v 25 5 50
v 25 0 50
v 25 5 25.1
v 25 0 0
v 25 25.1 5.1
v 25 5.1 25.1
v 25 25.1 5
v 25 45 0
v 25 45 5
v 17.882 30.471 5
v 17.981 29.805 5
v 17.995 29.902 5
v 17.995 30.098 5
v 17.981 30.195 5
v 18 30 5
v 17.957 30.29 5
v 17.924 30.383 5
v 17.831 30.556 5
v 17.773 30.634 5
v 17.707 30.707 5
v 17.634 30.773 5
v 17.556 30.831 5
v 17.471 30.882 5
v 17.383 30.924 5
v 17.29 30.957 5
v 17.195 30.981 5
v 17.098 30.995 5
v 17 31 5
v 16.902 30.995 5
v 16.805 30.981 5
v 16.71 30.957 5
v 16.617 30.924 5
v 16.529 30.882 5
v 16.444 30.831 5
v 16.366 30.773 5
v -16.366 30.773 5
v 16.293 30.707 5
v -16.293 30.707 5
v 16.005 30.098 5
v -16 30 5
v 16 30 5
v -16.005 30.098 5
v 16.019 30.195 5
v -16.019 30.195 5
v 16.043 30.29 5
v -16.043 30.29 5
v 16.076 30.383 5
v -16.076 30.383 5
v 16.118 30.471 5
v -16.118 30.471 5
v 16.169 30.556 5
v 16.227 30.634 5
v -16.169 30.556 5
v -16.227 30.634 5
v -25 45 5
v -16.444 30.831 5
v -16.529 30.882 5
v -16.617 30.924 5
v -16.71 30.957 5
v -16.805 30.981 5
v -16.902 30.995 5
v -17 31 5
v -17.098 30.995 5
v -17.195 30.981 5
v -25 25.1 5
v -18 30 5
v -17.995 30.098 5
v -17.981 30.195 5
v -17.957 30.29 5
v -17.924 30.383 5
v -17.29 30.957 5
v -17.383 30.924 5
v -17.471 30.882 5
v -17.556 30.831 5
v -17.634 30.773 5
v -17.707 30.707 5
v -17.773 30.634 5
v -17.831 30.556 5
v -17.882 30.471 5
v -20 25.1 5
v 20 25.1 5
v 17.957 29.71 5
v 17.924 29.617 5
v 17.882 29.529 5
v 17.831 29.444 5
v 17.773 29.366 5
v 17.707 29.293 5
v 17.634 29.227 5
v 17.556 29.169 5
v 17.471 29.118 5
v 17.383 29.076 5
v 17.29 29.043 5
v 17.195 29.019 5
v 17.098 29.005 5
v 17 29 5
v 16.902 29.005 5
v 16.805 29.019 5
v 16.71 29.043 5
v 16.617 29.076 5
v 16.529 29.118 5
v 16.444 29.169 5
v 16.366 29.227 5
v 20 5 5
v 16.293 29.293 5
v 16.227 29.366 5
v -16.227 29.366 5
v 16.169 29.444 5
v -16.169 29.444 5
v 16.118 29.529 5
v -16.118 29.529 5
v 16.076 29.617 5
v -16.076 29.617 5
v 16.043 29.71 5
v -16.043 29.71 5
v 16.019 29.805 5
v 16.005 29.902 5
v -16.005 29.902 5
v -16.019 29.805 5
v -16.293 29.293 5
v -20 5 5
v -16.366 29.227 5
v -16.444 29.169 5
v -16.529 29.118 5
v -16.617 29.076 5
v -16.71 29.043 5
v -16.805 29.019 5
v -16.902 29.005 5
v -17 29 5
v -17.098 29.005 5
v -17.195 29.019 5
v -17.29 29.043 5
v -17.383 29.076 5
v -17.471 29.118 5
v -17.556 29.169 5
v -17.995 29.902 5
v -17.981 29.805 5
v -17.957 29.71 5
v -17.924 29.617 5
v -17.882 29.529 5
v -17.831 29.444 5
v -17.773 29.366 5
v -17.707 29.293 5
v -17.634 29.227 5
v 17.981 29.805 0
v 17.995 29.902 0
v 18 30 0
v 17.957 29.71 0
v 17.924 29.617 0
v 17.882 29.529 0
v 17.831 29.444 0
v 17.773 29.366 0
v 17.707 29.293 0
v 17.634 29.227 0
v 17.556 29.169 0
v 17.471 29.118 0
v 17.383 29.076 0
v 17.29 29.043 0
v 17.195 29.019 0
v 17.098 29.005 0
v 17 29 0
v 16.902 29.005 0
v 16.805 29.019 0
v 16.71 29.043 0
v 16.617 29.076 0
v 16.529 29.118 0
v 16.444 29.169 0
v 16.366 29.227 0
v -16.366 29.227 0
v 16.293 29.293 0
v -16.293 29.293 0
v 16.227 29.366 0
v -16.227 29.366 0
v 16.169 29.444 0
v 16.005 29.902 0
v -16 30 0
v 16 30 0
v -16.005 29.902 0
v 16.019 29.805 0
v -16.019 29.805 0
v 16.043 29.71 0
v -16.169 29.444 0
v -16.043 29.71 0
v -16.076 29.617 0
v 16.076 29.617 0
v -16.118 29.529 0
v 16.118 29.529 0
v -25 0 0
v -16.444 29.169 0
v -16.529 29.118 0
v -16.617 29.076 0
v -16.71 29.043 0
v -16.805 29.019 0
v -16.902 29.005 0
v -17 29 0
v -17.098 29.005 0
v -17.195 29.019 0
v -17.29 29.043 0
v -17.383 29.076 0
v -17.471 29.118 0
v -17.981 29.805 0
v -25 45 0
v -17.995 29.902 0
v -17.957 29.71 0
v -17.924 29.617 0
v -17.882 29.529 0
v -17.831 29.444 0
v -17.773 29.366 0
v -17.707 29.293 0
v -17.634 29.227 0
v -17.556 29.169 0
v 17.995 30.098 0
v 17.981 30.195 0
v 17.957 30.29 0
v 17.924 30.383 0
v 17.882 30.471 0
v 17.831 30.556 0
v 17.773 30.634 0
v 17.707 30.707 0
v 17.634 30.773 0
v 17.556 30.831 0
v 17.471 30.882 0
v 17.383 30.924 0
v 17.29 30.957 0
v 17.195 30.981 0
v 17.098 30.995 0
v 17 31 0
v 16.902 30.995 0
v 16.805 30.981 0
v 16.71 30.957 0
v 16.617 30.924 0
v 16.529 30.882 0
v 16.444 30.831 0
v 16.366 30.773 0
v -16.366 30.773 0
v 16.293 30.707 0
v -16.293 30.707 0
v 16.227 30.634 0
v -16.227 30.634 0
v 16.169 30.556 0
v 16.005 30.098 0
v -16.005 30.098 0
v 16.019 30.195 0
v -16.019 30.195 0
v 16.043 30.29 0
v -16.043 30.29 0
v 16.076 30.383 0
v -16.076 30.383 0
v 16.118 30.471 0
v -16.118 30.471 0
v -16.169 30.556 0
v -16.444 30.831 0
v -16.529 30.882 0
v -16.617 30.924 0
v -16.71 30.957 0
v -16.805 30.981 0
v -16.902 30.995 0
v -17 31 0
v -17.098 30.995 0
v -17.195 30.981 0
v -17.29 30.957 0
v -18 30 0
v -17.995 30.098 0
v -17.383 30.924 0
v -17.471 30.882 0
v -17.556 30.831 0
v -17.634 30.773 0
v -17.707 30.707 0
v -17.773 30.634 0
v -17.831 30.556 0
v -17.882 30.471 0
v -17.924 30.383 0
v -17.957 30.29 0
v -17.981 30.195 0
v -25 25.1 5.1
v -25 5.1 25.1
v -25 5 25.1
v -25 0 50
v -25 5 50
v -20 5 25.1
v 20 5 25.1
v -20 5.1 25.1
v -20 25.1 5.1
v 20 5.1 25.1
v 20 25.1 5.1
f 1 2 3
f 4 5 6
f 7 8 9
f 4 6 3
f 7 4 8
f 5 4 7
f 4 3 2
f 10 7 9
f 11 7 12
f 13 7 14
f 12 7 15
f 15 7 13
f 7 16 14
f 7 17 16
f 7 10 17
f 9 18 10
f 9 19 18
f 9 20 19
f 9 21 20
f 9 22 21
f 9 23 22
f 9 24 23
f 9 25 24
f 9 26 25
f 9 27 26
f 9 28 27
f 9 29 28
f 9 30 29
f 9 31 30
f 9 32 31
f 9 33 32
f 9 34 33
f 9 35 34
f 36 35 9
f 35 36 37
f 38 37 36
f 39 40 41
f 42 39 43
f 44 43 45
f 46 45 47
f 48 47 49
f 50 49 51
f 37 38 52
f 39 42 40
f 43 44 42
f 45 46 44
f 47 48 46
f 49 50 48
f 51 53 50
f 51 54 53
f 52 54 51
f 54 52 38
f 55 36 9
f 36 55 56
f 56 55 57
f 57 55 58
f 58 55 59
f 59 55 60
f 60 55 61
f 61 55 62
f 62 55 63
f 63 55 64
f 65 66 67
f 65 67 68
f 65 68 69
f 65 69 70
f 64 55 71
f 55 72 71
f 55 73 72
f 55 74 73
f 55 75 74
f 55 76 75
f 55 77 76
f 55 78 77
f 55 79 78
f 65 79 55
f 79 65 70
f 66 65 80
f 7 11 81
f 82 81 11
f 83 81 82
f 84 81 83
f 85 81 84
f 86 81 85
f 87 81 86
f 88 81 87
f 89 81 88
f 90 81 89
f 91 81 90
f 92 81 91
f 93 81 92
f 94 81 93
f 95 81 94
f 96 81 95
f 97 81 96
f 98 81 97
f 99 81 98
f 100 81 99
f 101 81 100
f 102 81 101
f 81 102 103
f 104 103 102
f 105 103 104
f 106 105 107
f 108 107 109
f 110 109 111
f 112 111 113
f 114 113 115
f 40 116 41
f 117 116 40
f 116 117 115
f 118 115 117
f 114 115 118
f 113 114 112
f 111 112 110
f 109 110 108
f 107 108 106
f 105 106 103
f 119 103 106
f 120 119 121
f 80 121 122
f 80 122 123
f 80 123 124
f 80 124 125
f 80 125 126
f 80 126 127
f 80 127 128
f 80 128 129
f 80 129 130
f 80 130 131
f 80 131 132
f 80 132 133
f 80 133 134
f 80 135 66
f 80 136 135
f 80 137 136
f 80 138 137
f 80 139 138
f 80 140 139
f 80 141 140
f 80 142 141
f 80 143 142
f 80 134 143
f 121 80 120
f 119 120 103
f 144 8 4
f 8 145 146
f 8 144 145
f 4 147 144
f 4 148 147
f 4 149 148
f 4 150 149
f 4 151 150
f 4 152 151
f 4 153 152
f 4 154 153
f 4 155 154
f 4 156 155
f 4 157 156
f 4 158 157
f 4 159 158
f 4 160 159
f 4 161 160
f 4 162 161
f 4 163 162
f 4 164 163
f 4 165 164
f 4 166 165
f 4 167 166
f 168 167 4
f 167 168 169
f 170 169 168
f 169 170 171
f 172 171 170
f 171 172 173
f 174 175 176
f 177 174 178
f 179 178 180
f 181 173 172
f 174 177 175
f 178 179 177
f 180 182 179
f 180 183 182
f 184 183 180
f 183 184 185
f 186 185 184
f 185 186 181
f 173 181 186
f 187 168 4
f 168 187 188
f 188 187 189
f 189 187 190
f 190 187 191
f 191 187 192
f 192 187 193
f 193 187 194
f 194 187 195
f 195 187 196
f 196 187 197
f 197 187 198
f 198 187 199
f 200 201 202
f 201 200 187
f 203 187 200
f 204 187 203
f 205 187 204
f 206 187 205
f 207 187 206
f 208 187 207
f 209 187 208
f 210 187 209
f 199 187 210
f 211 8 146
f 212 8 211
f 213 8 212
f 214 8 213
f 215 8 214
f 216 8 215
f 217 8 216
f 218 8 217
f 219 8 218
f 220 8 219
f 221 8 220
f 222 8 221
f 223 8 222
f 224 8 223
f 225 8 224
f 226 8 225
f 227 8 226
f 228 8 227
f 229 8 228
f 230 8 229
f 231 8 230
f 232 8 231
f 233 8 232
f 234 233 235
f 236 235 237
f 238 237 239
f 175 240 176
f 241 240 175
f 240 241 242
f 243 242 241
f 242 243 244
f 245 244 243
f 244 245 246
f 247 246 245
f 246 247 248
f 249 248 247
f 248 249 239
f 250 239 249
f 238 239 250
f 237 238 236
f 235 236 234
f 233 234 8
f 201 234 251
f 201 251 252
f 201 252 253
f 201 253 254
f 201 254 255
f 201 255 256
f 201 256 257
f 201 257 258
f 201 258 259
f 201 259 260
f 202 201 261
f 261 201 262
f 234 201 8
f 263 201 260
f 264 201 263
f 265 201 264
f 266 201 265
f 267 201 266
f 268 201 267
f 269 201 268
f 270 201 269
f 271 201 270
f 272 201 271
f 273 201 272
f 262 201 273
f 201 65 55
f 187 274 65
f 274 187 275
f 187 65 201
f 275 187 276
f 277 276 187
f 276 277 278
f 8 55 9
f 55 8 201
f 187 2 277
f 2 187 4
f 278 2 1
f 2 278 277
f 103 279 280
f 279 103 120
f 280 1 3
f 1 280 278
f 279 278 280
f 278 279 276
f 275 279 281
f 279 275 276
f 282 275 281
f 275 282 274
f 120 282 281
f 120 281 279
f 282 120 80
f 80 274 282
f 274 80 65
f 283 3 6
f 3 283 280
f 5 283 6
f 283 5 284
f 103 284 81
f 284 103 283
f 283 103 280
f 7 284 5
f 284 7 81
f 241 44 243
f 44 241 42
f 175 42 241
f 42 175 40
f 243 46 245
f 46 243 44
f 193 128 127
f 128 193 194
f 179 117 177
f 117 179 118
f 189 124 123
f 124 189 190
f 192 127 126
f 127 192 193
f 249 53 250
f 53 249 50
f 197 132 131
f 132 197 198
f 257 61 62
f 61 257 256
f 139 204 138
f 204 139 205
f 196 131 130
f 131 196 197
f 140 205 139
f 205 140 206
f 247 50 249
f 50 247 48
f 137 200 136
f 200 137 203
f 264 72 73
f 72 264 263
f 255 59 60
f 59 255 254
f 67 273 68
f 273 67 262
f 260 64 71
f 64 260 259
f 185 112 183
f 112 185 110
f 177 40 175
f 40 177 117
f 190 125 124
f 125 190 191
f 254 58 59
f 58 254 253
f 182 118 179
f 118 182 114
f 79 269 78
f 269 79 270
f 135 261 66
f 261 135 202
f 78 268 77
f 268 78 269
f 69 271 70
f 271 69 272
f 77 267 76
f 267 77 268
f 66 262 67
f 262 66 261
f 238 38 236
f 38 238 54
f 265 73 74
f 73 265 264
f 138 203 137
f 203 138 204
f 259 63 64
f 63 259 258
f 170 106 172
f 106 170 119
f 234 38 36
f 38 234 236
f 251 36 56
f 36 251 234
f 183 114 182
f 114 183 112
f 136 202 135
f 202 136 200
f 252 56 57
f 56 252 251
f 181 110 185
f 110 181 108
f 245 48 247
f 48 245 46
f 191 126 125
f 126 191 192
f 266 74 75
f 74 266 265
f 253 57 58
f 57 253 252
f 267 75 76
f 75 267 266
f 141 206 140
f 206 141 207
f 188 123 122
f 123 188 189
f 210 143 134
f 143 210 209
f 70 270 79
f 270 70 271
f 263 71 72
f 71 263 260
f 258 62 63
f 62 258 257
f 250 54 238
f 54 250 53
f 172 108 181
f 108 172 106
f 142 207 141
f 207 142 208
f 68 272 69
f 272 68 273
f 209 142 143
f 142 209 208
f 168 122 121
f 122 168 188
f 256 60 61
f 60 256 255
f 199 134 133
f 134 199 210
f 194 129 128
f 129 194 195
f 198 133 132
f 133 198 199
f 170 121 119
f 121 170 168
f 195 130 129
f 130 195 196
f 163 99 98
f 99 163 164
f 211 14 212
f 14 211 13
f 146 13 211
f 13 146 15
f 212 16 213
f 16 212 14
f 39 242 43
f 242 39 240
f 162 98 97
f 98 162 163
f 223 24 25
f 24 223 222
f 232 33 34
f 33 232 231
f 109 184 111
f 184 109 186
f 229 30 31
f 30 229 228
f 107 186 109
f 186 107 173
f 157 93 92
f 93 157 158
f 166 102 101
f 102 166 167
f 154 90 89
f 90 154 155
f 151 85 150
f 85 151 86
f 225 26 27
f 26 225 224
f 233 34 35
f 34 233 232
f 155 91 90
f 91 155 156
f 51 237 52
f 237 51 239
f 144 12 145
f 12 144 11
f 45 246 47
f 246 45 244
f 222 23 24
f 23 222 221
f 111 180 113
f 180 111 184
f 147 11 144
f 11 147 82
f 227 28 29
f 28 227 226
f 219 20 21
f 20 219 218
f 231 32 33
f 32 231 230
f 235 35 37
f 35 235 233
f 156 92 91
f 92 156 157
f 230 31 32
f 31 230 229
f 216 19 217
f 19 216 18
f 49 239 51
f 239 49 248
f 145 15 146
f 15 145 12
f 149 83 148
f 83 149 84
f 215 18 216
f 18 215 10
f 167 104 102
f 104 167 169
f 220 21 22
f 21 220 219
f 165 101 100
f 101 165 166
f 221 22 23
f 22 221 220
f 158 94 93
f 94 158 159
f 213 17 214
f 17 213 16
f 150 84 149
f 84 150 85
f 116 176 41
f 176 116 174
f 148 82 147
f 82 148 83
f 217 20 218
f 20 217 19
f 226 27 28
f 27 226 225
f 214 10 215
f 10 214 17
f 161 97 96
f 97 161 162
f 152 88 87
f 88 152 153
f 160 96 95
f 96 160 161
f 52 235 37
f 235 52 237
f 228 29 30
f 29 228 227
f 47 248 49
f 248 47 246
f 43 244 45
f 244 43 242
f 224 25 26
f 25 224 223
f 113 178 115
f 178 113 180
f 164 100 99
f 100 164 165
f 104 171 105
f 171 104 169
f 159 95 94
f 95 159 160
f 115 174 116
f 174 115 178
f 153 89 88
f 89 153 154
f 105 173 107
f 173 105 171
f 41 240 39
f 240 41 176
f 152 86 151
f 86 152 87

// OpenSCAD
// L-shaped NEMA 17 Stepper Motor Mounting Bracket
// Designed for 3D printing (FDM)

// --- Dimensions (mm) ---
// Base Plate
base_width = 50;          // x from -25 to 25
base_depth = 45;          // y from 0 to 45
base_height = 5;          // z from 0 to 5
m4_hole_dia = 4.5;        // M4 through-holes
m4_hole_x1 = -17;         // Position of first M4 hole
m4_hole_x2 = 17;          // Position of second M4 hole
m4_hole_y = 30;           // Y position of M4 holes

// Vertical Motor Plate
vert_width = 50;          // x from -25 to 25
vert_depth = 5;           // y from 0 to 5
vert_height = 50;         // z from 0 to 50
boss_hole_dia = 23;       // Centering boss hole diameter
boss_hole_z = 28;         // Z position of boss hole center
m3_hole_dia = 3.4;        // M3 screw hole diameter
m3_pattern_size = 31;     // Square pattern size for M3 screws

// Gussets
gusset_thickness = 5;     // Thickness of the gussets
gusset_leg_length = 20;    // Length of the triangular legs
gusset_corner_y = 5;       // Y position of the right-angle corner
gusset_corner_z = 5;       // Z position of the right-angle corner

// --- Parameters ---
$fn = 64;

// --- Modules ---

module base_plate() {
    translate([-base_width/2, 0, 0])
        cube([base_width, base_depth, base_height]);
}

module vertical_plate() {
    translate([-vert_width/2, 0, 0])
        cube([vert_width, vert_depth, vert_height]);
}

module gusset_left() {
    // Left gusset: x from -25 to -20
    translate([-base_width/2, gusset_corner_y, gusset_corner_z])
    hull() {
        translate([0, 0, 0]) cube([gusset_thickness, 0.1, 0.1]);
        translate([0, gusset_leg_length, 0]) cube([gusset_thickness, 0.1, 0.1]);
        translate([0, 0, gusset_leg_length]) cube([gusset_thickness, 0.1, 0.1]);
    }
}

module gusset_right() {
    // Right gusset: x from 20 to 25
    translate([base_width/2 - gusset_thickness, gusset_corner_y, gusset_corner_z])
    hull() {
        translate([0, 0, 0]) cube([gusset_thickness, 0.1, 0.1]);
        translate([0, gusset_leg_length, 0]) cube([gusset_thickness, 0.1, 0.1]);
        translate([0, 0, gusset_leg_length]) cube([gusset_thickness, 0.1, 0.1]);
    }
}

module base_holes() {
    // M4 vertical through-holes
    translate([m4_hole_x1, m4_hole_y, -0.1])
        cylinder(diameter=m4_hole_dia, h=base_height + 0.2);
    translate([m4_hole_x2, m4_hole_y, -0.1])
        cylinder(diameter=m4_hole_dia, h=base_height + 0.2);
}

module motor_holes() {
    // Holes are cut through the vertical plate (along Y axis)
    // We rotate the cylinder 90 degrees around X to align with Y axis
    
    // Centering boss hole
    translate([0, -0.1, boss_hole_z])
        rotate([90, 0, 0])
        cylinder(diameter=boss_hole_dia, h=vert_depth + 0.2);
    
    // M3 screw holes in a square pattern
    half_pattern = m3_pattern_size / 2;
    
    // Hole 1: (+X, +Z)
    translate([half_pattern, -0.1, boss_hole_z + half_pattern])
        rotate([90, 0, 0])
        cylinder(diameter=m3_hole_dia, h=vert_depth + 0.2);
        
    // Hole 2: (-X, +Z)
    translate([-half_pattern, -0.1, boss_hole_z + half_pattern])
        rotate([90, 0, 0])
        cylinder(diameter=m3_hole_dia, h=vert_depth + 0.2);
        
    // Hole 3: (+X, -Z)
    translate([half_pattern, -0.1, boss_hole_z - half_pattern])
        rotate([90, 0, 0])
        cylinder(diameter=m3_hole_dia, h=vert_depth + 0.2);
        
    // Hole 4: (-X, -Z)
    translate([-half_pattern, -0.1, boss_hole_z - half_pattern])
        rotate([90, 0, 0])
        cylinder(diameter=m3_hole_dia, h=vert_depth + 0.2);
}

// --- Final Assembly ---

difference() {
    union() {
        base_plate();
        vertical_plate();
        gusset_left();
        gusset_right();
    }
    base_holes();
    motor_holes();
}
